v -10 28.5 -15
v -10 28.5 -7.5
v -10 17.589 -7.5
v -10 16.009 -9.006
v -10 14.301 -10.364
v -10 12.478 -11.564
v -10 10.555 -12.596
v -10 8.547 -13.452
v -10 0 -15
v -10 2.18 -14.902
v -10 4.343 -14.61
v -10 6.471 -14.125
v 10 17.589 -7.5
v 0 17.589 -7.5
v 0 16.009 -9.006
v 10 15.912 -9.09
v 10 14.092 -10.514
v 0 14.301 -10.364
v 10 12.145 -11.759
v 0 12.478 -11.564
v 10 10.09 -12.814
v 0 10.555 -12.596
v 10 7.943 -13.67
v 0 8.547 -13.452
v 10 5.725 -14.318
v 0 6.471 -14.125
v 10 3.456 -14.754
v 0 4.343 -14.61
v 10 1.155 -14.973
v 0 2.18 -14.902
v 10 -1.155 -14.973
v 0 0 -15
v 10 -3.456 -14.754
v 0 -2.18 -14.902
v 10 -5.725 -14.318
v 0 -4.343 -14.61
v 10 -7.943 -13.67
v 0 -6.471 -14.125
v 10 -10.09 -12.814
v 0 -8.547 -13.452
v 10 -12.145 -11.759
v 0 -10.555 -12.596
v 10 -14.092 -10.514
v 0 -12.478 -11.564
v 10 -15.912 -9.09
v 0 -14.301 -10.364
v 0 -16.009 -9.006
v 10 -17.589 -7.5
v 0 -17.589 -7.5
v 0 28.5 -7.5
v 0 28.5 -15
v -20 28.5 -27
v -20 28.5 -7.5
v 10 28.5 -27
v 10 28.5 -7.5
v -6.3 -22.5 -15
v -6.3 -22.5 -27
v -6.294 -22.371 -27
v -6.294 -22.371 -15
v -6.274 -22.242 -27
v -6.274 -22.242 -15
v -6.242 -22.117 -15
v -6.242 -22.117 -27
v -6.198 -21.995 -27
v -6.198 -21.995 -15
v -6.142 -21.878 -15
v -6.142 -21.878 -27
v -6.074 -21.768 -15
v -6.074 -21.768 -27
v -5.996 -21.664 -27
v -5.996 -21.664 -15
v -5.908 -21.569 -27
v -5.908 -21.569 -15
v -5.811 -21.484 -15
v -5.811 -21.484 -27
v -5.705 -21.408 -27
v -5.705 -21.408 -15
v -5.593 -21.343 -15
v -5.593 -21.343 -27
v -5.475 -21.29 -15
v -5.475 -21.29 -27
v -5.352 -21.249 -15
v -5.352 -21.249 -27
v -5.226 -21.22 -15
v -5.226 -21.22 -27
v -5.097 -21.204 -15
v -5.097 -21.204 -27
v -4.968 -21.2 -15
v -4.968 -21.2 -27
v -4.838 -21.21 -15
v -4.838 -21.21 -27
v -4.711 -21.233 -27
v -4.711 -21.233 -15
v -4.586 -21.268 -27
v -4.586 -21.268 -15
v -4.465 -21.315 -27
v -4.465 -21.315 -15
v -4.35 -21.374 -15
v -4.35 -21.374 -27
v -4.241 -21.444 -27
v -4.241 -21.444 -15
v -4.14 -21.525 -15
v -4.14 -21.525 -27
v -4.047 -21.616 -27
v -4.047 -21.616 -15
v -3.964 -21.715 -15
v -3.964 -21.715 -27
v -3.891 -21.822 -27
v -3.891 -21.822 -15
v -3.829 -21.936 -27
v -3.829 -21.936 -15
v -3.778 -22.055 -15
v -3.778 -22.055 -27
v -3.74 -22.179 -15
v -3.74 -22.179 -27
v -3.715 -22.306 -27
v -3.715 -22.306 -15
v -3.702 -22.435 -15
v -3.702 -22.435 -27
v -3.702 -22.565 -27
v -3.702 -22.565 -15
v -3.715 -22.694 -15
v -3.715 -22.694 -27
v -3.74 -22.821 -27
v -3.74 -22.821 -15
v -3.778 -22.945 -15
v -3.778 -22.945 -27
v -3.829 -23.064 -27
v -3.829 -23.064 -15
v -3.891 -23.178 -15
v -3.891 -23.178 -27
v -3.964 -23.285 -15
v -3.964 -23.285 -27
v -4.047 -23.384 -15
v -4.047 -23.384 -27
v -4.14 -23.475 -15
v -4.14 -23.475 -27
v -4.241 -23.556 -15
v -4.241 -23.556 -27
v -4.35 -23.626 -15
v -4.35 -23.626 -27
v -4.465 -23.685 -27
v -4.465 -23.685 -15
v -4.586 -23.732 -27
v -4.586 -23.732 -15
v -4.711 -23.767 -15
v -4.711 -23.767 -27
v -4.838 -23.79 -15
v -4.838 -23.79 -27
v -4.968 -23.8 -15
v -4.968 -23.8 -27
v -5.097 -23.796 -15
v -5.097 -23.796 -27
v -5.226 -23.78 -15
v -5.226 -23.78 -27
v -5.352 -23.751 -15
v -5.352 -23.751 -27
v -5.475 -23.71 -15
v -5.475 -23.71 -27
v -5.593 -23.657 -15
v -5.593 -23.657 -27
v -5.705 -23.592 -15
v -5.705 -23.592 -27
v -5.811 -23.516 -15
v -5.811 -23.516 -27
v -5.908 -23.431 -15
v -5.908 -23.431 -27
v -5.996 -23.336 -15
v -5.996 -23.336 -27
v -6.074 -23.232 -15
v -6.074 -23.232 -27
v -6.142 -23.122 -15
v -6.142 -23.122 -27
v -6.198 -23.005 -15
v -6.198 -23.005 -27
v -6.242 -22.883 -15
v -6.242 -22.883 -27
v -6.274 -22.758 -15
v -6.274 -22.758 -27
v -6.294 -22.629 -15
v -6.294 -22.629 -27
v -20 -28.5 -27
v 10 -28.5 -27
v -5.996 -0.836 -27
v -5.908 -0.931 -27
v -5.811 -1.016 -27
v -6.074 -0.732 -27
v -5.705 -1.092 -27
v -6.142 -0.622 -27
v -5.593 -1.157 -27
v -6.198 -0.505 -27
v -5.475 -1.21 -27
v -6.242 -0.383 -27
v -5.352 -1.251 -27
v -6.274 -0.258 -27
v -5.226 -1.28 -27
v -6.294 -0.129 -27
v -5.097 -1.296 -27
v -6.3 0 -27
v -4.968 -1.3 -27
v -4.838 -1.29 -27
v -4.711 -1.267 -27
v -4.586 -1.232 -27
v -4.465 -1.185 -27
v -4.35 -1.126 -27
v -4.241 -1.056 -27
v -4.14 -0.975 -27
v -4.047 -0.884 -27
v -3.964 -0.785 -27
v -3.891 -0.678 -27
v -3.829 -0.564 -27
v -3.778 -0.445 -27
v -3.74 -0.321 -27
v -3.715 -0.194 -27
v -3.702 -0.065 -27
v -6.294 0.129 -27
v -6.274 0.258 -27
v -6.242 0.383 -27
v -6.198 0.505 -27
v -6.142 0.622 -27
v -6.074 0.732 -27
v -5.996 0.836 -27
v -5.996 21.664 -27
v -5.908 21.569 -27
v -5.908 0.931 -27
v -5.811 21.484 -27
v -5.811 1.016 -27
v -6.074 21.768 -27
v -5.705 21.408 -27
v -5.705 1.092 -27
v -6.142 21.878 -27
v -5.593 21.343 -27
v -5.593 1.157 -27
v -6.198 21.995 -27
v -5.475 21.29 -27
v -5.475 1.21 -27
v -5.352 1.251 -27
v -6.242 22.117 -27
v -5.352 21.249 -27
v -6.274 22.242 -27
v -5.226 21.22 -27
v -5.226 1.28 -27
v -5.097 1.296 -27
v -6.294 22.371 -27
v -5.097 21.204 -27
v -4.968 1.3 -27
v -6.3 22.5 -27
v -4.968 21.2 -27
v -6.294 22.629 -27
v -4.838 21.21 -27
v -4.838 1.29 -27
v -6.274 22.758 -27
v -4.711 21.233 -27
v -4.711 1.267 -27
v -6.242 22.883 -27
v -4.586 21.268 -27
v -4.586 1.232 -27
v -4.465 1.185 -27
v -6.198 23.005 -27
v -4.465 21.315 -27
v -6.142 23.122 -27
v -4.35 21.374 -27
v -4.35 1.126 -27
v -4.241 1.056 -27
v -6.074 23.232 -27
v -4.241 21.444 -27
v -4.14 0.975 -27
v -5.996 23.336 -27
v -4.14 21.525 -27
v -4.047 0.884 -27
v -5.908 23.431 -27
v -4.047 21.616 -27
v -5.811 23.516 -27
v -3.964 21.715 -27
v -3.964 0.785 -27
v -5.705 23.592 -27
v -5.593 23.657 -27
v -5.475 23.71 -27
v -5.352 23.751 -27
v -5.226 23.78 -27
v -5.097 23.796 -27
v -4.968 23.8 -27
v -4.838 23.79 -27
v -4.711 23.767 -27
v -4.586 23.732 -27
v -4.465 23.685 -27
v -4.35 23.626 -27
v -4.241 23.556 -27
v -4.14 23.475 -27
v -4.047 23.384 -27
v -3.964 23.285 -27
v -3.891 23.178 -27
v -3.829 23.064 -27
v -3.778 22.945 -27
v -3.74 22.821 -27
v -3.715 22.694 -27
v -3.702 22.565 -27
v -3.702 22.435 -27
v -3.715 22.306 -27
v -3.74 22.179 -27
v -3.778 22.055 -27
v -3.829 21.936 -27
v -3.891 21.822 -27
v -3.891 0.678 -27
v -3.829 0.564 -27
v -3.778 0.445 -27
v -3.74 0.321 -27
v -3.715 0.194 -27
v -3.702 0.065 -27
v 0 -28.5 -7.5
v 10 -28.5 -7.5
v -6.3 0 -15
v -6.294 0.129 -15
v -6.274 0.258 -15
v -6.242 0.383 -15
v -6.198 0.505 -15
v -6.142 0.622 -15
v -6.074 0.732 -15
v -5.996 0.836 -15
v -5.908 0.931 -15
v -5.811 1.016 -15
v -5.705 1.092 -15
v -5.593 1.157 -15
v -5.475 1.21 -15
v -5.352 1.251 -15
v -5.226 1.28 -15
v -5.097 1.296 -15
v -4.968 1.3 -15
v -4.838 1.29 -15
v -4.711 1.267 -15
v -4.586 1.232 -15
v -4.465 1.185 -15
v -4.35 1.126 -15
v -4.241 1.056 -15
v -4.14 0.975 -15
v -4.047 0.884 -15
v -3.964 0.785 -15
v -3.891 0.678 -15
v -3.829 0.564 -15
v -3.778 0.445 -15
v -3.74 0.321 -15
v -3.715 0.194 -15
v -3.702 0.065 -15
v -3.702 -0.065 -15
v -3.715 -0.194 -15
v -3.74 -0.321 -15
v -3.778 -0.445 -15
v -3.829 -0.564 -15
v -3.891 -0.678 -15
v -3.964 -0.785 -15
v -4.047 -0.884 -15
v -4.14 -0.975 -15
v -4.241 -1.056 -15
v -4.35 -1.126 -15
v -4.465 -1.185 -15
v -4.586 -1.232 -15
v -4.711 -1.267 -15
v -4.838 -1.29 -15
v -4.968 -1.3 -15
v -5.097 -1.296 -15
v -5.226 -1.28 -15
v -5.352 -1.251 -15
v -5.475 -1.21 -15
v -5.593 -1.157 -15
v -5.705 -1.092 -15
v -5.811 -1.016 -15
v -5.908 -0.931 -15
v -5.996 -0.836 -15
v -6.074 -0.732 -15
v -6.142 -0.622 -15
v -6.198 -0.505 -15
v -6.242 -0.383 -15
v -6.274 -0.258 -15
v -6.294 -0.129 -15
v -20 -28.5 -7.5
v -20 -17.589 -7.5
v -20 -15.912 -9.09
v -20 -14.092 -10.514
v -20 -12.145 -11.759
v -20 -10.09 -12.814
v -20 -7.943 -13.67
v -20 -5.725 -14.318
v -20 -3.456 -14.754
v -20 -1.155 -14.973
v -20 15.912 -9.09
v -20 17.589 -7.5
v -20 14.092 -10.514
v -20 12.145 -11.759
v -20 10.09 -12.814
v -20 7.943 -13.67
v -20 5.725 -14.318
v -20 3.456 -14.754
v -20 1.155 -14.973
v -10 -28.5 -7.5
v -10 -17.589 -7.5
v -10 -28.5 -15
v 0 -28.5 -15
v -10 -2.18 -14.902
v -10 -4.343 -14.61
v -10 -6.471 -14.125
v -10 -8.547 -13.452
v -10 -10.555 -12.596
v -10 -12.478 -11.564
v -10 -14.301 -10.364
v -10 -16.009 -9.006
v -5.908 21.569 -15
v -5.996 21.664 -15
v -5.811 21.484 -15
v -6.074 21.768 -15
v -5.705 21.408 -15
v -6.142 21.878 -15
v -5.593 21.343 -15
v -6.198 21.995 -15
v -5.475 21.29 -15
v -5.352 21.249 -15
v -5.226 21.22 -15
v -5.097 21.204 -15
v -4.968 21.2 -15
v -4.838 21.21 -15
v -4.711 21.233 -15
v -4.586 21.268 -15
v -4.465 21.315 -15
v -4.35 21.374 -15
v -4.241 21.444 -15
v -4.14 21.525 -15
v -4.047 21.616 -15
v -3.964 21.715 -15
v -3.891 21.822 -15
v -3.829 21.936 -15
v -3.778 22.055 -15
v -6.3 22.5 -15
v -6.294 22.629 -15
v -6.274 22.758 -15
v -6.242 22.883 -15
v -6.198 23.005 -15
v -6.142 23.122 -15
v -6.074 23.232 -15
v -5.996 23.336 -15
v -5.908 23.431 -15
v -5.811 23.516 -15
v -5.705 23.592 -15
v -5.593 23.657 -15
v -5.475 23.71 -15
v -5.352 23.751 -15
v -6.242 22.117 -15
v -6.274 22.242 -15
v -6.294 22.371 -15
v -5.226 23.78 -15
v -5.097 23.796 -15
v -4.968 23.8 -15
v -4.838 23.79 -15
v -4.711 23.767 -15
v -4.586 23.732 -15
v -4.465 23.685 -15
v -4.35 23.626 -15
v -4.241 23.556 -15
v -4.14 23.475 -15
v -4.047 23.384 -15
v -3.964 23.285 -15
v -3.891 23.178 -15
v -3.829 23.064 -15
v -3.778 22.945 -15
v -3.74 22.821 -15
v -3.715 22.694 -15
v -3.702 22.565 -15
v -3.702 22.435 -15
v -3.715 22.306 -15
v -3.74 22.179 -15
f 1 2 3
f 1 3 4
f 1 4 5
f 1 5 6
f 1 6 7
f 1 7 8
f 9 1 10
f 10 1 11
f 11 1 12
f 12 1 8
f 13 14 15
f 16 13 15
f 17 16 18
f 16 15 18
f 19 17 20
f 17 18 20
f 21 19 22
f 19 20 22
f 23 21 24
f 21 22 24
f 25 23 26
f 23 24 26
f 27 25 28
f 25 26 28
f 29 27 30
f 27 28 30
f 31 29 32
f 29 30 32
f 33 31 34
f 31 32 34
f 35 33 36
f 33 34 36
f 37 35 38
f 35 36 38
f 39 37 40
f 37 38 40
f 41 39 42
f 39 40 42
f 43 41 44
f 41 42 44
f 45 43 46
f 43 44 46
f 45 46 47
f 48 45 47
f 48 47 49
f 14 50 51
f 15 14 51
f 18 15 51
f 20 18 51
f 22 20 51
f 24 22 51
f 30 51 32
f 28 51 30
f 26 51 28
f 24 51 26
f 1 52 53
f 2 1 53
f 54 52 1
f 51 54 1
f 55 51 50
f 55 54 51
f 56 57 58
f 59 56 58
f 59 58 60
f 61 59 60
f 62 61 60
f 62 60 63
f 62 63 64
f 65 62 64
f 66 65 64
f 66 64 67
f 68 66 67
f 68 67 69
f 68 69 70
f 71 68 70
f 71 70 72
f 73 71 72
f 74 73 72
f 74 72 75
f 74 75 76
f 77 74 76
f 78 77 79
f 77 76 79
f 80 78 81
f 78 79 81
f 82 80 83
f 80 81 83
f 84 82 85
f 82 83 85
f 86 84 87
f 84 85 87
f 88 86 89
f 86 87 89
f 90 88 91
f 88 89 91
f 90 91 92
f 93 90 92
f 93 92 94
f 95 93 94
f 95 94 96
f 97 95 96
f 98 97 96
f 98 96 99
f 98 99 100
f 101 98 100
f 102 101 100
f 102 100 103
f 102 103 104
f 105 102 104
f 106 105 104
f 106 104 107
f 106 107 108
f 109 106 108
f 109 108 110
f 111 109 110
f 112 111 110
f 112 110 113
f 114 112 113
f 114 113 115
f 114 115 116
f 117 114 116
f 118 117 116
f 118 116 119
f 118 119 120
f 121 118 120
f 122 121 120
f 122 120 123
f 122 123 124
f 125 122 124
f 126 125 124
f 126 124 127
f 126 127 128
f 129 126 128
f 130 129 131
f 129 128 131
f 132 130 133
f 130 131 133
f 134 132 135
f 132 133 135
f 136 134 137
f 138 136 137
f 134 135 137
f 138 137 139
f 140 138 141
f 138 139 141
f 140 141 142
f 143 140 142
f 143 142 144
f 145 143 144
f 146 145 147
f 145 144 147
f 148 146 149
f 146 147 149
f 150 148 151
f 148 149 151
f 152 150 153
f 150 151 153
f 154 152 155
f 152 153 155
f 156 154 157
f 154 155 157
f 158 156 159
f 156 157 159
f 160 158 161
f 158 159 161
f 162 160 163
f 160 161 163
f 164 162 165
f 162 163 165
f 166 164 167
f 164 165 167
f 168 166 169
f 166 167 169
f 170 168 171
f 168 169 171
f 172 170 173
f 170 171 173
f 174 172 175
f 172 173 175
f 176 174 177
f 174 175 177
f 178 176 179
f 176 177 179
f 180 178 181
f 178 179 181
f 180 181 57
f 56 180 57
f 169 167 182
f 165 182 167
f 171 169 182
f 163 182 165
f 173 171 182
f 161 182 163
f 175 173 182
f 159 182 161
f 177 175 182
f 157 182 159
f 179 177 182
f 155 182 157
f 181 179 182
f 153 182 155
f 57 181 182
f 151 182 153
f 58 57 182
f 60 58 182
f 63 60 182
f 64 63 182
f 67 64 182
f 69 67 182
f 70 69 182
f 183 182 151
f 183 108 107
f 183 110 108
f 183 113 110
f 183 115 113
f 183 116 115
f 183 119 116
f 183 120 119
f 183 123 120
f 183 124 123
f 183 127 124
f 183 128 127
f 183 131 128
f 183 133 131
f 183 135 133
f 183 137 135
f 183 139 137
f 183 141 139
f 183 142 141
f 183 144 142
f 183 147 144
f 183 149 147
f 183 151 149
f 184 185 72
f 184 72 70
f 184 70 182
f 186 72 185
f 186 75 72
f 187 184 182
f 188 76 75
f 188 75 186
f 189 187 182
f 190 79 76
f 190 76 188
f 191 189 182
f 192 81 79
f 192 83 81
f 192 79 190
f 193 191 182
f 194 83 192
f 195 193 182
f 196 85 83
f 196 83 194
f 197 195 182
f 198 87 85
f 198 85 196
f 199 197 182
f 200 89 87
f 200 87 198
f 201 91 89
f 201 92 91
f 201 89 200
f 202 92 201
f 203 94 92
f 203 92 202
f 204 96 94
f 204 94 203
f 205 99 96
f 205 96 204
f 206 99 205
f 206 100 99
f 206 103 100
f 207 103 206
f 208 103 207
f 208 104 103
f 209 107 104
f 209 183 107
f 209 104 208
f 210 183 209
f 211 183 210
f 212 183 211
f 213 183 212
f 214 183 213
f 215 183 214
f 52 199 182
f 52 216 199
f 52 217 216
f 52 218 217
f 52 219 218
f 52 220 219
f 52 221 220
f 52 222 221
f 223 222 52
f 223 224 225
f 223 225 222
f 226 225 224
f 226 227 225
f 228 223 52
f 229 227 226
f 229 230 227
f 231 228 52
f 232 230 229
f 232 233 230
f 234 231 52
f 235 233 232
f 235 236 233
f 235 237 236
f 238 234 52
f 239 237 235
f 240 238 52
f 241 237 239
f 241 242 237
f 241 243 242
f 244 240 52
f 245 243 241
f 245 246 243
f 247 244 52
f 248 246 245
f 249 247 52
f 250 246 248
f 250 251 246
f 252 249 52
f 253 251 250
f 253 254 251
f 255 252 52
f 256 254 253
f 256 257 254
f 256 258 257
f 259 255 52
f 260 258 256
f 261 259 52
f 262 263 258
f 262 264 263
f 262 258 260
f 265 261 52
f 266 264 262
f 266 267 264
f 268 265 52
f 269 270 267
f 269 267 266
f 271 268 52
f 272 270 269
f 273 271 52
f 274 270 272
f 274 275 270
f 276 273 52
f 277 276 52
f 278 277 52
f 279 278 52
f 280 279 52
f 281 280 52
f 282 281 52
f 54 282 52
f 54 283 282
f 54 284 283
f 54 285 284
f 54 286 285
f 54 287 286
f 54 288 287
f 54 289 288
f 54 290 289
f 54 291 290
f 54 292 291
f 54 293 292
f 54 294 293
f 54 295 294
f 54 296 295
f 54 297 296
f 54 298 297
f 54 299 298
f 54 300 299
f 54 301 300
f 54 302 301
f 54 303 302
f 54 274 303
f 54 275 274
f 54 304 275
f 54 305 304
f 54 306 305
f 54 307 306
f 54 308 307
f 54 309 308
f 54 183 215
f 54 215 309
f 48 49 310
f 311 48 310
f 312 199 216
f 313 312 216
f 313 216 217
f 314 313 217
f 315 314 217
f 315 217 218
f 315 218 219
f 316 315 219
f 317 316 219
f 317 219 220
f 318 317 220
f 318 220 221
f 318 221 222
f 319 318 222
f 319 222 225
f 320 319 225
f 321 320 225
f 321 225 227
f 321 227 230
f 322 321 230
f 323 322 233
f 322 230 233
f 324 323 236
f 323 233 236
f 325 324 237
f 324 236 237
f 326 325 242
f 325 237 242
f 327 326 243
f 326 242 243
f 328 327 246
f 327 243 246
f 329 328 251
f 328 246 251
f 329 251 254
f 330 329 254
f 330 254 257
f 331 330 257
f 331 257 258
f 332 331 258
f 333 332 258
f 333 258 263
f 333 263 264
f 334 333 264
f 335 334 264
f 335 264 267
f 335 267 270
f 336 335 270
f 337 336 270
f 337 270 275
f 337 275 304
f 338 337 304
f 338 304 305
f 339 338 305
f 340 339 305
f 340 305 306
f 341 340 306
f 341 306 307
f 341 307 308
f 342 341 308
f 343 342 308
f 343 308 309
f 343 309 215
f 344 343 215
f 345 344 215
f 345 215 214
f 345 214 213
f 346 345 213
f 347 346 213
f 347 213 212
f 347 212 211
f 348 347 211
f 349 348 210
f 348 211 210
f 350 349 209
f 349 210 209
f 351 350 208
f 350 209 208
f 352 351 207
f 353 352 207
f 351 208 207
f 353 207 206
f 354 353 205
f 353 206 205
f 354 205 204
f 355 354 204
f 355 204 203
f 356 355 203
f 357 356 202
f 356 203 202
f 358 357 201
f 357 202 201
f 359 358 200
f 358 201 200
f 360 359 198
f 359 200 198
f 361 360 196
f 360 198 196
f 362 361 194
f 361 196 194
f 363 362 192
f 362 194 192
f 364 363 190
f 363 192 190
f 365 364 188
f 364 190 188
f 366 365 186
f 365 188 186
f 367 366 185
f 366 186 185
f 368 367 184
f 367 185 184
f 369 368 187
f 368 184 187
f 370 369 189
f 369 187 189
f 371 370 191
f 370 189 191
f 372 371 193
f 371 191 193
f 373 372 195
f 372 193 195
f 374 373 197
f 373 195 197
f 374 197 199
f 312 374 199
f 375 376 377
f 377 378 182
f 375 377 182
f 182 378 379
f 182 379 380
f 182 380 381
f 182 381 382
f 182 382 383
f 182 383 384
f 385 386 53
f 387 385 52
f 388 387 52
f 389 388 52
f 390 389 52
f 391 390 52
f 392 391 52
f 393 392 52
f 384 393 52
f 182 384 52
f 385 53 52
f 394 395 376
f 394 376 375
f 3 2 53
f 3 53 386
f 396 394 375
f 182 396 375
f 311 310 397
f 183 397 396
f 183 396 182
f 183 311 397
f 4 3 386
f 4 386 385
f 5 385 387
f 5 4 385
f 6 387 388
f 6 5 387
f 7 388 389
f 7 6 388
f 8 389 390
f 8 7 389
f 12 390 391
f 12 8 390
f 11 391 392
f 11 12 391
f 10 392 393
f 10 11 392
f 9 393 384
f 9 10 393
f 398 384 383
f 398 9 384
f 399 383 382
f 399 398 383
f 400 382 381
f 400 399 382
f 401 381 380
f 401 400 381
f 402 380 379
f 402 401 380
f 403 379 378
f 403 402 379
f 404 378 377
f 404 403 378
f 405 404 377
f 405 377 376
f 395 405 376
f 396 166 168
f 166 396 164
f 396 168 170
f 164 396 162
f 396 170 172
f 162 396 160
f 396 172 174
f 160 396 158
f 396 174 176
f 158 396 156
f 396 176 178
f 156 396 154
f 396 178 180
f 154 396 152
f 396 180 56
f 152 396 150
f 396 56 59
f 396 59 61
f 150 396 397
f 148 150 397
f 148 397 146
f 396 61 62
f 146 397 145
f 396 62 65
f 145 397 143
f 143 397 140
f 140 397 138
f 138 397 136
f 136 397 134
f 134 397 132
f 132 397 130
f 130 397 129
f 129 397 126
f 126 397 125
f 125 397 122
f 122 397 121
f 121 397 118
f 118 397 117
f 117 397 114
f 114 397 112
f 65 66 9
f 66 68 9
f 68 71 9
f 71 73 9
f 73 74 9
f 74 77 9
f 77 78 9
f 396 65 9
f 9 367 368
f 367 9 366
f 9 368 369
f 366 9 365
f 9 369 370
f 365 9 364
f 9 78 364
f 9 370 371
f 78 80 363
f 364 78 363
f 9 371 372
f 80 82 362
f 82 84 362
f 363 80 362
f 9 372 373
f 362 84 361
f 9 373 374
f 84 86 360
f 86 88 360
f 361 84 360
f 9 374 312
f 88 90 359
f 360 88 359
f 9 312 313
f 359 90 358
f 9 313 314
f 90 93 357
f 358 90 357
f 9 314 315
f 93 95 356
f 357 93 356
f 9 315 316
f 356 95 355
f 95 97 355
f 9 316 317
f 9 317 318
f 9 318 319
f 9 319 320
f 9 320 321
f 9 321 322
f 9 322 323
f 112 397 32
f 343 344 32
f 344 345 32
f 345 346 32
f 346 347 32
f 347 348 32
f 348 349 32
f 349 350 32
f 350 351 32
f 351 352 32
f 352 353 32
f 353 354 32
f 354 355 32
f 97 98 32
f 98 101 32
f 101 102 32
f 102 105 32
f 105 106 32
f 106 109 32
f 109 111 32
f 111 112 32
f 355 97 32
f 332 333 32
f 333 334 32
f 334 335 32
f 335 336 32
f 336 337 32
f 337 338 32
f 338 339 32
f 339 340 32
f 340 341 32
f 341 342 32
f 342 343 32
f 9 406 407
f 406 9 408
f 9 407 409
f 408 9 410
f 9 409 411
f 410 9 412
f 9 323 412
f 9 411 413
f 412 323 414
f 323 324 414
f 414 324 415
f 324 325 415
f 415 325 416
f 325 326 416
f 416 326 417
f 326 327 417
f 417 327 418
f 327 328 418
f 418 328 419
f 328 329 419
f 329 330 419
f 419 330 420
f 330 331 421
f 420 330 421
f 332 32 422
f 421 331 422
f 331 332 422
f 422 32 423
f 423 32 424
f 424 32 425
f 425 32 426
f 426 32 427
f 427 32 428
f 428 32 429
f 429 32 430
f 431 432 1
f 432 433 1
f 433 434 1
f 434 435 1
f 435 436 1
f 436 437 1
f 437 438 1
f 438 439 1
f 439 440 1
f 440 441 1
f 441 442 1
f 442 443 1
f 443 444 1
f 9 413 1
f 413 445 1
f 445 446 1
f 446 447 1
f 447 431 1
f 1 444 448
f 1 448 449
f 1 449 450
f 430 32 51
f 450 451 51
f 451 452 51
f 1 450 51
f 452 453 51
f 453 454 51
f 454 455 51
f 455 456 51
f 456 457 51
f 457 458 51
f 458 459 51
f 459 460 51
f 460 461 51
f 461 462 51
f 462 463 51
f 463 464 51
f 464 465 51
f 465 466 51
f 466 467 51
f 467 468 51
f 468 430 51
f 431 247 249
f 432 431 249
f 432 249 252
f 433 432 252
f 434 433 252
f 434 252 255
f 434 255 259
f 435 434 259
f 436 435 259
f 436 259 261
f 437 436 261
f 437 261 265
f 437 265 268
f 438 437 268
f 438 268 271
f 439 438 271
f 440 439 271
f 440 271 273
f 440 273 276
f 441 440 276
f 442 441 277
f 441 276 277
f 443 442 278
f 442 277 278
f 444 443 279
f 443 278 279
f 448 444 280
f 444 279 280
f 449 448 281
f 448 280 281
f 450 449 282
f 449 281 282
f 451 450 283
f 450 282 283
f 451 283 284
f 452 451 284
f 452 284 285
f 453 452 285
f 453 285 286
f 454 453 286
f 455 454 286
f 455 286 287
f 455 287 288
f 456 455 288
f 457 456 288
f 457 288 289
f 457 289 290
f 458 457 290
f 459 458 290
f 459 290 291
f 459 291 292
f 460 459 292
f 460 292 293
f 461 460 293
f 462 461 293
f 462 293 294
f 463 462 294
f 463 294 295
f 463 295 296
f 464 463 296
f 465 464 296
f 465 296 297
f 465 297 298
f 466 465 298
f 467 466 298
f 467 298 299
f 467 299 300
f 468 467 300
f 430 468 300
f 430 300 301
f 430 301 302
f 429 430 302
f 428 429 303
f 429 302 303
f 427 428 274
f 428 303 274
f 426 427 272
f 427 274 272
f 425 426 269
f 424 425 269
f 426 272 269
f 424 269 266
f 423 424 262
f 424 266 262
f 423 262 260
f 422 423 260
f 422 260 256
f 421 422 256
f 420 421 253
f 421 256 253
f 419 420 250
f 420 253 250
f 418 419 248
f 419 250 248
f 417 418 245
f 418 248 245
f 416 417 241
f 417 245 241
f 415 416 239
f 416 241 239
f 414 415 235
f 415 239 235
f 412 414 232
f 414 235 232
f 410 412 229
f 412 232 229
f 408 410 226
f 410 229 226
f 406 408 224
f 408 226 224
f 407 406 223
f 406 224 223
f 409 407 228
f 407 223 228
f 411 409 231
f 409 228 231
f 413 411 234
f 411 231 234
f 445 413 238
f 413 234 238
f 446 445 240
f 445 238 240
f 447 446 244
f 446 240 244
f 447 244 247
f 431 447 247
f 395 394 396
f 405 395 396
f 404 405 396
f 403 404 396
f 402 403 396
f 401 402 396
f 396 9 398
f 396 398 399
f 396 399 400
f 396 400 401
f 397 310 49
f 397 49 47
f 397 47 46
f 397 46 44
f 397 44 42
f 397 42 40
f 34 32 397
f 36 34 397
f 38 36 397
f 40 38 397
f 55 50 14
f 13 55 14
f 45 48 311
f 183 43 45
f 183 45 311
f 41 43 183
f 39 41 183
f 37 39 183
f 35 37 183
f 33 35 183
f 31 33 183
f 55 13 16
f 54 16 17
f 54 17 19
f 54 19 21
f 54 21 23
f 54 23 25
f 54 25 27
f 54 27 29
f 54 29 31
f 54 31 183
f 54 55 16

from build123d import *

# Parameters (mm, degrees)
BOSS_EXTRUDE1_DEPTH     = 10
SKETCH4_W               = 12
SKETCH4_H               = 57
BOSS_EXTRUDE2_DEPTH     = 10
SKETCH3_R               = 1.3
CUT_EXTRUDE1_DEPTH      = 1
CUT_EXTRUDE1_DEPTH_BACK = 20.5


with BuildPart() as part:
    # Sketch2 → Boss-Extrude1 (new body)
    with BuildSketch(Plane(origin=(0, 0, 0), x_dir=(0, 0, -1), z_dir=(1, 0, 0))):
        with BuildLine():
            Line((27, 28.5), (7.5, 28.5))
            Line((7.5, 28.5), (7.5, 17.589059099))
            ThreePointArc((7.5, 17.589059099), (15, 0), (7.5, -17.589059099))
            Line((7.5, -17.589059099), (7.5, -28.5))
            Line((7.5, -28.5), (27, -28.5))
            Line((27, -28.5), (27, 28.5))
        make_face()
    boss_extrude1 = extrude(amount=BOSS_EXTRUDE1_DEPTH)

    # Sketch4 → Boss-Extrude2 (add)
    with BuildSketch(Plane.ZY):
        with Locations((-21, 0)):
            Rectangle(SKETCH4_W, SKETCH4_H)
    extrude(amount=BOSS_EXTRUDE2_DEPTH)

    # Mirror1: Boss-Extrude1 across plane
    add(boss_extrude1.mirror(Plane.ZY.offset(5)))

    # Sketch3 → Cut-Extrude1 (cut, two sides)
    with BuildSketch(Plane(origin=(0, 0, -27), x_dir=(-1, 0, 0), z_dir=(0, 0, -1))) as cut_extrude1_sk:
        with Locations((5, -22.5)):
            Circle(SKETCH3_R)
        with Locations((5, 22.5)):
            Circle(SKETCH3_R)
        with Locations((5, 0)):
            Circle(SKETCH3_R)
    extrude(amount=CUT_EXTRUDE1_DEPTH, mode=Mode.SUBTRACT)
    extrude(cut_extrude1_sk.sketch, amount=-CUT_EXTRUDE1_DEPTH_BACK, mode=Mode.SUBTRACT)


solid = part.part
